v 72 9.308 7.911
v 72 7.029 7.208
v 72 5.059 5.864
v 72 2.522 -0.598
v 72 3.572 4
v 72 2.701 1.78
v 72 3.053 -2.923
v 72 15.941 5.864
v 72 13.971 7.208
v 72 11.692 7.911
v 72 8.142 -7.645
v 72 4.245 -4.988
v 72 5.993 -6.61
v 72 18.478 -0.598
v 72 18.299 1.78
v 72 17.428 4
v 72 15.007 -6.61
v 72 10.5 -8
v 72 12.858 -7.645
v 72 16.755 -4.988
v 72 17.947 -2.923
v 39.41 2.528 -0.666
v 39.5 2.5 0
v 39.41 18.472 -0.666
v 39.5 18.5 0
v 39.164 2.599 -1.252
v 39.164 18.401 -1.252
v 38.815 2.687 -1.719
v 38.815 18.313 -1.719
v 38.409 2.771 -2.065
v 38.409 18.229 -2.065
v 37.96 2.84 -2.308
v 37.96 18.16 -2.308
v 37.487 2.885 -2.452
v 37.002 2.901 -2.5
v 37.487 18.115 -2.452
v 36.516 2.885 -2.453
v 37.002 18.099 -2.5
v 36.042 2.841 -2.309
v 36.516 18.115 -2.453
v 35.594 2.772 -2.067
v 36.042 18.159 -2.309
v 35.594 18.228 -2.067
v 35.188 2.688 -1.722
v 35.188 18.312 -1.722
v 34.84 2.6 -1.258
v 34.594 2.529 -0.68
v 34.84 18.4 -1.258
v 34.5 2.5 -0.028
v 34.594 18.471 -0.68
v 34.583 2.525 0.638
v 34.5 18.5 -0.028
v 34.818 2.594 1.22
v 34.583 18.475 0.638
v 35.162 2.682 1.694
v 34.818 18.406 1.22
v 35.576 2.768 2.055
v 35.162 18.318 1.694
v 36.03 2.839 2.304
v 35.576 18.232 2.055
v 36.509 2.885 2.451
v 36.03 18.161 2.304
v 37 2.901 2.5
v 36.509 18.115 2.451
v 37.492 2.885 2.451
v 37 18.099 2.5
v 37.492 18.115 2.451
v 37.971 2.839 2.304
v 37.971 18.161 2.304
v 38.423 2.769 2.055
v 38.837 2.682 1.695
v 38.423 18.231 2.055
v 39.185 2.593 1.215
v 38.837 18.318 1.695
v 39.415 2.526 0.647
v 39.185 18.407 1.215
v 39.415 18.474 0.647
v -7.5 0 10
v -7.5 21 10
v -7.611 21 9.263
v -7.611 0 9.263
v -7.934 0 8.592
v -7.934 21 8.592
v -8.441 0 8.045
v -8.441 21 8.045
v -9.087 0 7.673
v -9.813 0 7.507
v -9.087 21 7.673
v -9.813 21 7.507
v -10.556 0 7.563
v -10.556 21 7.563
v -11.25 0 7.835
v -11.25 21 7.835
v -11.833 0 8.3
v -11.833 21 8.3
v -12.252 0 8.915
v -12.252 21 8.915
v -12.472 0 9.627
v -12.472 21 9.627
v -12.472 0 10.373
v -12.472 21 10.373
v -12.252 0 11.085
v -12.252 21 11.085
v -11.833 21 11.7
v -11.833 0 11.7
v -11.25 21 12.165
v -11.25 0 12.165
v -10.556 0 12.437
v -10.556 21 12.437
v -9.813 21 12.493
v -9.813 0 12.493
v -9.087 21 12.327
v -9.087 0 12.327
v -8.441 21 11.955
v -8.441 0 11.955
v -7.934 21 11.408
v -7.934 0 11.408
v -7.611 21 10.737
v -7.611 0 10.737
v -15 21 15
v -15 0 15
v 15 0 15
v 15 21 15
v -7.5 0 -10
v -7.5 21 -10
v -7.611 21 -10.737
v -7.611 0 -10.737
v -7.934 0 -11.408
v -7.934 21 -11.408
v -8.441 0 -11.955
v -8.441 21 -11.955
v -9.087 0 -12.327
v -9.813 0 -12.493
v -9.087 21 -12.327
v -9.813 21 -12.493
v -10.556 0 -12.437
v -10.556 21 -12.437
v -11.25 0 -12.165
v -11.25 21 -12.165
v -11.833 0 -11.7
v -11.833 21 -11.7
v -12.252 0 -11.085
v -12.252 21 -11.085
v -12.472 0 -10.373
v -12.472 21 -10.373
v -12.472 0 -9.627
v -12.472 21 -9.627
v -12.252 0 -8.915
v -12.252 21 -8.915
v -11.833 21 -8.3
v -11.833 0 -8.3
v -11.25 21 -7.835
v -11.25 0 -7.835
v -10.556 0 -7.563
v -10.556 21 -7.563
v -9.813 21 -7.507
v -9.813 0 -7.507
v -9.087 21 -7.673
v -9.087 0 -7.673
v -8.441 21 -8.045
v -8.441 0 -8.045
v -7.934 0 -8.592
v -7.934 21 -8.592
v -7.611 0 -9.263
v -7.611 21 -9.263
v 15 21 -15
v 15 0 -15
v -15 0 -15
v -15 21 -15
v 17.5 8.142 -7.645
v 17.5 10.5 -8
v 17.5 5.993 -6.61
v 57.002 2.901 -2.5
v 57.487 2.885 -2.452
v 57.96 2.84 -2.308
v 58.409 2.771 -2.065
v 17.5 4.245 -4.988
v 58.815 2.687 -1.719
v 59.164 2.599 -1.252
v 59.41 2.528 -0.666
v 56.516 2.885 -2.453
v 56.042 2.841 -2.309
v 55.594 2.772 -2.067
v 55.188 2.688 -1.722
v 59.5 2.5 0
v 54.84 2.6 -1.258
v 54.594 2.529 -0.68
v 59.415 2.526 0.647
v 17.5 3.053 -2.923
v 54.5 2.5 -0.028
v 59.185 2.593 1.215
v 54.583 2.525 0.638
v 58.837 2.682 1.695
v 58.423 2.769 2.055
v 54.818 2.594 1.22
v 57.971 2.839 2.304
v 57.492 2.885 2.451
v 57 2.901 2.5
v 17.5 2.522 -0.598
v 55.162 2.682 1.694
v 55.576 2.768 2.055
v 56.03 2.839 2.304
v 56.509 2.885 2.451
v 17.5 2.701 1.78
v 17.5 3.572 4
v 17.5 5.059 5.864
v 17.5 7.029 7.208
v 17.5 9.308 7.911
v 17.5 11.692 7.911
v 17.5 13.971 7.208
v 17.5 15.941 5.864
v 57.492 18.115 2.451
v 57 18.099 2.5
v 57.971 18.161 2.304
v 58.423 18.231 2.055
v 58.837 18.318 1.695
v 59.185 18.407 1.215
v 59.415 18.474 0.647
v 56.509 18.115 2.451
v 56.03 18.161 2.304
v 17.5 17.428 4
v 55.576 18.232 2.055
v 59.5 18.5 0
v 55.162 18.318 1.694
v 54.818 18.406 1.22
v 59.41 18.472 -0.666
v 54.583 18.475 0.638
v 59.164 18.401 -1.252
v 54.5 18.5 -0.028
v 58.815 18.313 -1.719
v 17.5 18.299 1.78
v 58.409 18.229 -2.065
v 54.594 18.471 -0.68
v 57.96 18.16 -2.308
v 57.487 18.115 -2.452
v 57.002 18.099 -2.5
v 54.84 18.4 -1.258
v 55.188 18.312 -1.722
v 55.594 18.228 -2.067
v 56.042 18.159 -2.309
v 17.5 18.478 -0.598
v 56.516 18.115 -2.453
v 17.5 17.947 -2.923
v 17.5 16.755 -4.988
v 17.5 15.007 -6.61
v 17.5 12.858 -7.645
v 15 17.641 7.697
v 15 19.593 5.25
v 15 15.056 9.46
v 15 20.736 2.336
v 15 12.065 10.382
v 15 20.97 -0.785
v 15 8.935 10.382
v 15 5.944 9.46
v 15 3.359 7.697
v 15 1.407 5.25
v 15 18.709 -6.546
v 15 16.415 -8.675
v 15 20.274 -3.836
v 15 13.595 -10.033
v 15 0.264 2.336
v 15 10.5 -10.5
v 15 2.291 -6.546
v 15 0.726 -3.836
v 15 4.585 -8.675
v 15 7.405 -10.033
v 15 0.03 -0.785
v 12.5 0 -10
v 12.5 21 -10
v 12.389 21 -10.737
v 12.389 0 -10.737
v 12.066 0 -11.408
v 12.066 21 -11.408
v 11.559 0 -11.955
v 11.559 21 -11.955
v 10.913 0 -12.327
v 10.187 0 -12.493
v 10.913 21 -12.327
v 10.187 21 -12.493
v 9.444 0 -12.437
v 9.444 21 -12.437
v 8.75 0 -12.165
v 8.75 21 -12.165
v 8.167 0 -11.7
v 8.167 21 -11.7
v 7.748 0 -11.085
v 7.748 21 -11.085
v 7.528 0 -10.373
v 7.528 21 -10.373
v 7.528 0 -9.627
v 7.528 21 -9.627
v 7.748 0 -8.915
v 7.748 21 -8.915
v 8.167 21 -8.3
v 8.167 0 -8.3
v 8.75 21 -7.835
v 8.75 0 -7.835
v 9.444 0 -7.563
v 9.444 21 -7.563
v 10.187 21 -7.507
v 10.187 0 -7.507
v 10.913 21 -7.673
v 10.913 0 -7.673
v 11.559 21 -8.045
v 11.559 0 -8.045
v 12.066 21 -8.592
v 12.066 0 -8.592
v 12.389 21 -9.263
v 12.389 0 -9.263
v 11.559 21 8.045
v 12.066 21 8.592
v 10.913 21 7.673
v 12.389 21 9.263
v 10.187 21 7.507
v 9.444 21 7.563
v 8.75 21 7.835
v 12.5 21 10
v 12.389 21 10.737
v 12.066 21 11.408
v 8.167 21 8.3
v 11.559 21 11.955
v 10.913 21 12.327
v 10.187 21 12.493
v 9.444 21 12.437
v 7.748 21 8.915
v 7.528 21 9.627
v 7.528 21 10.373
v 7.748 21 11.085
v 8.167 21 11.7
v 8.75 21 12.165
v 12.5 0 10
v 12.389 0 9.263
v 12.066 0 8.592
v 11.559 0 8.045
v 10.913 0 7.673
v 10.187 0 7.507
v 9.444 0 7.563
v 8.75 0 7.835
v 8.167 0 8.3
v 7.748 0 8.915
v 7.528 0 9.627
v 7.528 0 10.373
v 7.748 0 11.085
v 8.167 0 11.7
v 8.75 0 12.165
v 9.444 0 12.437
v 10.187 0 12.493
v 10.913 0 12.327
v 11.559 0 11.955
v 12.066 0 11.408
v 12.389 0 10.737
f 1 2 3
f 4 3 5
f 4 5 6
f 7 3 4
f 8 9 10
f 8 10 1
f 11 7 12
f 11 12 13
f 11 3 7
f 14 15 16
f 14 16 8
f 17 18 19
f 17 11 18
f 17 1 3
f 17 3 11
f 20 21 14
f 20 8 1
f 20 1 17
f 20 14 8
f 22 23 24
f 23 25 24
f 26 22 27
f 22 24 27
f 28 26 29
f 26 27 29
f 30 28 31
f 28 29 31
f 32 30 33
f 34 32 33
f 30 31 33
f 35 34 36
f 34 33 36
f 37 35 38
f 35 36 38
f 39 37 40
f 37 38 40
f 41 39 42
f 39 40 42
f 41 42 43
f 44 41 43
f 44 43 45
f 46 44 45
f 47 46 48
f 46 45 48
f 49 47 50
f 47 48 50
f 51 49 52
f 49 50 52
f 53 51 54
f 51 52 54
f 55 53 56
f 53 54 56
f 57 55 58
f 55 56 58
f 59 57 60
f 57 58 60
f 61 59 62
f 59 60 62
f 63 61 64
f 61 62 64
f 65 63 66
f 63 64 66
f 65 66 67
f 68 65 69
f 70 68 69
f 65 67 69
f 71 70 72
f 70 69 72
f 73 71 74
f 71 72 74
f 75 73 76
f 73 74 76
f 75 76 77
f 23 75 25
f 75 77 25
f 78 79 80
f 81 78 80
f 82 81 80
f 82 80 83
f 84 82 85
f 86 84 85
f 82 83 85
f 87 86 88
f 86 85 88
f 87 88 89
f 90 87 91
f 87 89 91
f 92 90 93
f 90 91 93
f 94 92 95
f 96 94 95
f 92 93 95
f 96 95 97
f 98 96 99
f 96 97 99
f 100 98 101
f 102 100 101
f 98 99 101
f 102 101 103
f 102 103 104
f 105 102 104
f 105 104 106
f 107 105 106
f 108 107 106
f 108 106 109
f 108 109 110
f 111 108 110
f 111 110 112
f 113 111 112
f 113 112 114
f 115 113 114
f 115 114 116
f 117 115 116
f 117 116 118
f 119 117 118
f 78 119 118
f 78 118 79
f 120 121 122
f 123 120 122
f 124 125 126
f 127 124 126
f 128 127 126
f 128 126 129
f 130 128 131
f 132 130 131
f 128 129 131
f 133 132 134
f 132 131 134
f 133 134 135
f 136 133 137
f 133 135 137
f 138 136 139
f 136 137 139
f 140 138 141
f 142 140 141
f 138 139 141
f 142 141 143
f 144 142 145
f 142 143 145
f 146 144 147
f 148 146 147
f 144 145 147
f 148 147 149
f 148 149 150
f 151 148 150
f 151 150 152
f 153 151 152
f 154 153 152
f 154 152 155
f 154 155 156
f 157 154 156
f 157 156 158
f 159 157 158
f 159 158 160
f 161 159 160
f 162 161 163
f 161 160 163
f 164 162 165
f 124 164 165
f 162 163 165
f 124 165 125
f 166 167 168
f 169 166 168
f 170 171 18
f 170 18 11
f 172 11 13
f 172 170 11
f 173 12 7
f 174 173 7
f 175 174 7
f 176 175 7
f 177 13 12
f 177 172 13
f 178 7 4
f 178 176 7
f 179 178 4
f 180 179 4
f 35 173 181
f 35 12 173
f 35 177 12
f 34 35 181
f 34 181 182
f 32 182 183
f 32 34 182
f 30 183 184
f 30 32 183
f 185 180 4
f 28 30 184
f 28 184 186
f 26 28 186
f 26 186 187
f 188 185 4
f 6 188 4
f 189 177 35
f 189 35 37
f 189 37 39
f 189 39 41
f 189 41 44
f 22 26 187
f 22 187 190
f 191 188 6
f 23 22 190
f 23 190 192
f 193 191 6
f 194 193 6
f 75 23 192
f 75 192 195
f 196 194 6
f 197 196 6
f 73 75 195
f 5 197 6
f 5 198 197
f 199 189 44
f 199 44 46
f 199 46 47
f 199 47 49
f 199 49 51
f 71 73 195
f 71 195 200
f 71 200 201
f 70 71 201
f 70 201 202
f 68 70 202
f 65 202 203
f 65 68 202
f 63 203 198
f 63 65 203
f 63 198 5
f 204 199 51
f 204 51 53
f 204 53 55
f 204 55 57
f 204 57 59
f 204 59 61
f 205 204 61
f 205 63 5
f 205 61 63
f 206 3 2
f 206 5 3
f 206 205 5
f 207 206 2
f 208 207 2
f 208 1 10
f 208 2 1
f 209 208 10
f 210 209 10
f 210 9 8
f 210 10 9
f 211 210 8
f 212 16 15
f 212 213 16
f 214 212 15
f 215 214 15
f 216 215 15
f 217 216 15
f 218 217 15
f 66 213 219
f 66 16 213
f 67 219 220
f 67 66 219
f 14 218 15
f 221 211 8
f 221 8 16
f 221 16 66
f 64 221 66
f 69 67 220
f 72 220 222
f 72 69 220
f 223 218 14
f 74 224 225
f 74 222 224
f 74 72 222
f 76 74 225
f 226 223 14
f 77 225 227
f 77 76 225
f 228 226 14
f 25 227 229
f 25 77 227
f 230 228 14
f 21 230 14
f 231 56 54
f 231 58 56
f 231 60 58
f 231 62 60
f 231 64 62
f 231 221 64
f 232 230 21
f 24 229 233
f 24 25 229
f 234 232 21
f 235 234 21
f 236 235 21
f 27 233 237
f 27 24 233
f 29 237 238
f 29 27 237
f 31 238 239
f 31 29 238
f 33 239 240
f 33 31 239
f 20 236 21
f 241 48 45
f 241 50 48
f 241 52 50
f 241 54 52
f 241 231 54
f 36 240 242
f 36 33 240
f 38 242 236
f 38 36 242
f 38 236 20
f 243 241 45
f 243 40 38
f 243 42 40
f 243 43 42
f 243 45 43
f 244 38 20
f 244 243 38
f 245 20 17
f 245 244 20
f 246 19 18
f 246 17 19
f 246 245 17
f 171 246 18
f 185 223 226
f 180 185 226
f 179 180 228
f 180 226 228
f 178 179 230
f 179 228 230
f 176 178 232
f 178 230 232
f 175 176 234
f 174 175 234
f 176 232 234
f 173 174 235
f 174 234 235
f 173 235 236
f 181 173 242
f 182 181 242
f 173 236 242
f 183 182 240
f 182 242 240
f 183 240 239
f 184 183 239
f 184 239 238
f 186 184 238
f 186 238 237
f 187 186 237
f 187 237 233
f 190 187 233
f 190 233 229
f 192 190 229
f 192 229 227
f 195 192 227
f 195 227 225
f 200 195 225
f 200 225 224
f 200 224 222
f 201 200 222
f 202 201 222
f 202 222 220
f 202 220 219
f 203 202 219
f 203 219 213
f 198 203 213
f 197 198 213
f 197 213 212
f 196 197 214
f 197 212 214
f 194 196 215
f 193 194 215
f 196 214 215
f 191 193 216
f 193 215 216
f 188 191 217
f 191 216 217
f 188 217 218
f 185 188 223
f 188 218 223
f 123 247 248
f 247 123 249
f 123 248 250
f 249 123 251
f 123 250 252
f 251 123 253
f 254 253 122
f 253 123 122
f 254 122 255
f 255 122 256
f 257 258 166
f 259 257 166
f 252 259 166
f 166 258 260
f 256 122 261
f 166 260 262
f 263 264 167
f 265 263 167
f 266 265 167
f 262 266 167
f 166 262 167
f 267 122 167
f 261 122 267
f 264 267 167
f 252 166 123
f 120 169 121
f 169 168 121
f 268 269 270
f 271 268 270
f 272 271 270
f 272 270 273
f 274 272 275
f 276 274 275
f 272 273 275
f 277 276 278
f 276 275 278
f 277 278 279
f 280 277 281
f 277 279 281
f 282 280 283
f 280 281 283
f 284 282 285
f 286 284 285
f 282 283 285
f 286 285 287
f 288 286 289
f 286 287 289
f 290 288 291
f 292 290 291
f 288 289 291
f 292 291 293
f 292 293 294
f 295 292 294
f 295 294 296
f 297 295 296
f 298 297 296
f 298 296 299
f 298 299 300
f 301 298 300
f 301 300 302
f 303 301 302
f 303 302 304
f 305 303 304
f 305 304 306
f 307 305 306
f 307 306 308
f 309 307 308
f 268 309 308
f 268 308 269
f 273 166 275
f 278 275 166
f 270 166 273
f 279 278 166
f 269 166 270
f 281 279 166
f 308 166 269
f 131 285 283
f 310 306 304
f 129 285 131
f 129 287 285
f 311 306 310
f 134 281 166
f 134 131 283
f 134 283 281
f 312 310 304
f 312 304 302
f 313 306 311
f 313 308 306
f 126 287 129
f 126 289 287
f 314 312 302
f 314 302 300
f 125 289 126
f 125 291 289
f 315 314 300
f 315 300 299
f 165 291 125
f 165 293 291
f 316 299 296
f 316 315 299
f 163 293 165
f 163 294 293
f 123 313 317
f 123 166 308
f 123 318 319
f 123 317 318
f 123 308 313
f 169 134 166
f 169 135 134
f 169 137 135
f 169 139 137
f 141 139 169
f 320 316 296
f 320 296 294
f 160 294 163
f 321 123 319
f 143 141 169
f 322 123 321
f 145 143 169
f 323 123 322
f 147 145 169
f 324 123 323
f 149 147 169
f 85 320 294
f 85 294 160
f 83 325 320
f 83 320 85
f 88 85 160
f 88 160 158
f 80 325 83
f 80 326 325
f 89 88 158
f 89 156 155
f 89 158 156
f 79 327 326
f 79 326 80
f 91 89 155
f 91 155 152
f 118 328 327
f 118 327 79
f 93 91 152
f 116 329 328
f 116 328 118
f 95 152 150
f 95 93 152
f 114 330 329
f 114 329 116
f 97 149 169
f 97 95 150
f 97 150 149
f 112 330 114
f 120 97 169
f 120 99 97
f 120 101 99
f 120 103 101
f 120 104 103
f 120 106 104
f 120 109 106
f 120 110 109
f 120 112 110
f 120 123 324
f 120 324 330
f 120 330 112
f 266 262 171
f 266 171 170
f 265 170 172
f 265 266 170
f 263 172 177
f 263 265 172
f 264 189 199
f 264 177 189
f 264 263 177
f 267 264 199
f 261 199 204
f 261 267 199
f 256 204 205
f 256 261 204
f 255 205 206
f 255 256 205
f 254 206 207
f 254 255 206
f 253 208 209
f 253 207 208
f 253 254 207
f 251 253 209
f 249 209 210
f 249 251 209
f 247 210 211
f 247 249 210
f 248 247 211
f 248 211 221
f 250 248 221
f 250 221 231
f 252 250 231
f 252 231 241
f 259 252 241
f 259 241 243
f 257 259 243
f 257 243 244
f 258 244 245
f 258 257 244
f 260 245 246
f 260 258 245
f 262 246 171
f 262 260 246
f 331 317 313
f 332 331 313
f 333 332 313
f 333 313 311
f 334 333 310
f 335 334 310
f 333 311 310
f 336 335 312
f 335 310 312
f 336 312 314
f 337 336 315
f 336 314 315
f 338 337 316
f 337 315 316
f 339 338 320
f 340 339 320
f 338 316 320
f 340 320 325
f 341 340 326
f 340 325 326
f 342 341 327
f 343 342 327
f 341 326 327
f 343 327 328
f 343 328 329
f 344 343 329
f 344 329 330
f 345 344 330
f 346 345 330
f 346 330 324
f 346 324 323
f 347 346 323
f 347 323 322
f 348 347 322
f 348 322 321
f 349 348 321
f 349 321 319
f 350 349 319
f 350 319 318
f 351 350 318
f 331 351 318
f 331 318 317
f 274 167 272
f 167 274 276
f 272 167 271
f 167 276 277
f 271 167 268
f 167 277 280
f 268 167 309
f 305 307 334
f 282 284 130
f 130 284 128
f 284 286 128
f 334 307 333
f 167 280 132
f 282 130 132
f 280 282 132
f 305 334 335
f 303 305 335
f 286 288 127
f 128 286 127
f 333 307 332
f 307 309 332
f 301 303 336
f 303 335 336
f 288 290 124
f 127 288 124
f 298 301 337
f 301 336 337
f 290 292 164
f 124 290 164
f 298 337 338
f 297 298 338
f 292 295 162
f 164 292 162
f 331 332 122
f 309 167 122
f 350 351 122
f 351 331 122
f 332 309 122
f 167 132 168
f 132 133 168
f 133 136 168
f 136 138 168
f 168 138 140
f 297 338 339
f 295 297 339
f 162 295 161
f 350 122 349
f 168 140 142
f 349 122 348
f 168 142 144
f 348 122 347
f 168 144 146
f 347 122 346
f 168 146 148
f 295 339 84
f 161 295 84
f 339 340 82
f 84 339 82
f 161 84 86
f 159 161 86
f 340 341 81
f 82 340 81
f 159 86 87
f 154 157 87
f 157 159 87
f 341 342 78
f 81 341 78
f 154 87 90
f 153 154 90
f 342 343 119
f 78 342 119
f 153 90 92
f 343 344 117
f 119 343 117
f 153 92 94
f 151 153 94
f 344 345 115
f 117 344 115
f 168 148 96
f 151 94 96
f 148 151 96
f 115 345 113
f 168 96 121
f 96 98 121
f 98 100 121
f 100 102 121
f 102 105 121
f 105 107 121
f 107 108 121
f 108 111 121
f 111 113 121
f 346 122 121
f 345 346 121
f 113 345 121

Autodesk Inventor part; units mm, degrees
ref_plane "YZ Plane" through (0, 0, 0) normal (1, 0, 0) x (0, 1, 0)
ref_plane "XZ Plane" through (0, 0, 0) normal (0, 1, 0) x (-1, 0, 0)
ref_plane "XY Plane" through (0, 0, 0) normal (0, 0, 1) x (1, 0, 0)
sketch "Sketch1" plane through (0, 0, 0) normal (0, 1, 0) x (-1, 0, 0)
  line L0 (-15, -15) -> (15, -15)
  line L1 (15, -15) -> (15, 15)
  line L2 (15, 15) -> (-15, 15)
  line L3 (-15, 15) -> (-15, -15)
  line L4 (-15, -15) -> (15, 15) construction
  line L5 (15, -15) -> (-15, 15) construction
  point P0 (0, 0)
  dimension "d0" = 30
  dimension "d1" = 30
extrude "Extrusion1" add sketch "Sketch1" along normal blind 21
sketch "Sketch2" plane through (15, 0, 15) normal (1, 0, 0) x (0, 0, -1)
  circle A0 centre (15, 10.5) radius 8
  line L0 (0, 21) -> (30, 21) projected
  point P0 (15, 0)
  point P1 (15, 21)
  dimension "d4" = 16
  dimension "d29" = 10.5
extrude "Extrusion2" add sketch "Sketch2" along normal blind 57
sketch "Sketch3" plane through (0, 21, 0) normal (0, 1, 0) x (1, 0, 0)
  circle A0 centre (37, 0) radius 2.5
  circle A1 centre (57, 0) radius 2.5
  line L0 (15, -15) -> (15, 15) projected
  line L1 (72, -8) -> (72, 8) projected
  circle A2 centre (10, -10) radius 2.5
  line L2 (1.0234, -33.583) -> (-6.5136, -33.583)
  line L3 (-6.5136, -33.583) -> (-6.5136, -27.1544)
  circle A3 centre (-10, -10) radius 2.5
  circle A4 centre (10, 10) radius 2.5
  circle A5 centre (-10, 10) radius 2.5
  line L4 (-15, -15) -> (15, -15) projected
  line L5 (-15, 15) -> (-15, -15) projected
  point P0 (0, 0)
  point P1 (15, 0)
  point P2 (72, 0)
  dimension "d7" = 5
  dimension "d8" = 5
  dimension "d9" = 22
  dimension "d10" = 20
  dimension "d12" = 5
  dimension "d15" = 20
  dimension "d18" = 20
  dimension "d21" = 5
  dimension "d22" = 5
  dimension "d28" = 15
chamfer "Chamfer1" distance 2.5 angle 45 1 edges at (15, 10.5, 8)
extrude "Extrusion4" cut sketch "Sketch3" against normal through all contours A2 | A3 | A4 | A5
extrude "Extrusion5" cut sketch "Sketch3" against normal through all contours A0 | A1
properties part number "RodConnector_3DPrint"
